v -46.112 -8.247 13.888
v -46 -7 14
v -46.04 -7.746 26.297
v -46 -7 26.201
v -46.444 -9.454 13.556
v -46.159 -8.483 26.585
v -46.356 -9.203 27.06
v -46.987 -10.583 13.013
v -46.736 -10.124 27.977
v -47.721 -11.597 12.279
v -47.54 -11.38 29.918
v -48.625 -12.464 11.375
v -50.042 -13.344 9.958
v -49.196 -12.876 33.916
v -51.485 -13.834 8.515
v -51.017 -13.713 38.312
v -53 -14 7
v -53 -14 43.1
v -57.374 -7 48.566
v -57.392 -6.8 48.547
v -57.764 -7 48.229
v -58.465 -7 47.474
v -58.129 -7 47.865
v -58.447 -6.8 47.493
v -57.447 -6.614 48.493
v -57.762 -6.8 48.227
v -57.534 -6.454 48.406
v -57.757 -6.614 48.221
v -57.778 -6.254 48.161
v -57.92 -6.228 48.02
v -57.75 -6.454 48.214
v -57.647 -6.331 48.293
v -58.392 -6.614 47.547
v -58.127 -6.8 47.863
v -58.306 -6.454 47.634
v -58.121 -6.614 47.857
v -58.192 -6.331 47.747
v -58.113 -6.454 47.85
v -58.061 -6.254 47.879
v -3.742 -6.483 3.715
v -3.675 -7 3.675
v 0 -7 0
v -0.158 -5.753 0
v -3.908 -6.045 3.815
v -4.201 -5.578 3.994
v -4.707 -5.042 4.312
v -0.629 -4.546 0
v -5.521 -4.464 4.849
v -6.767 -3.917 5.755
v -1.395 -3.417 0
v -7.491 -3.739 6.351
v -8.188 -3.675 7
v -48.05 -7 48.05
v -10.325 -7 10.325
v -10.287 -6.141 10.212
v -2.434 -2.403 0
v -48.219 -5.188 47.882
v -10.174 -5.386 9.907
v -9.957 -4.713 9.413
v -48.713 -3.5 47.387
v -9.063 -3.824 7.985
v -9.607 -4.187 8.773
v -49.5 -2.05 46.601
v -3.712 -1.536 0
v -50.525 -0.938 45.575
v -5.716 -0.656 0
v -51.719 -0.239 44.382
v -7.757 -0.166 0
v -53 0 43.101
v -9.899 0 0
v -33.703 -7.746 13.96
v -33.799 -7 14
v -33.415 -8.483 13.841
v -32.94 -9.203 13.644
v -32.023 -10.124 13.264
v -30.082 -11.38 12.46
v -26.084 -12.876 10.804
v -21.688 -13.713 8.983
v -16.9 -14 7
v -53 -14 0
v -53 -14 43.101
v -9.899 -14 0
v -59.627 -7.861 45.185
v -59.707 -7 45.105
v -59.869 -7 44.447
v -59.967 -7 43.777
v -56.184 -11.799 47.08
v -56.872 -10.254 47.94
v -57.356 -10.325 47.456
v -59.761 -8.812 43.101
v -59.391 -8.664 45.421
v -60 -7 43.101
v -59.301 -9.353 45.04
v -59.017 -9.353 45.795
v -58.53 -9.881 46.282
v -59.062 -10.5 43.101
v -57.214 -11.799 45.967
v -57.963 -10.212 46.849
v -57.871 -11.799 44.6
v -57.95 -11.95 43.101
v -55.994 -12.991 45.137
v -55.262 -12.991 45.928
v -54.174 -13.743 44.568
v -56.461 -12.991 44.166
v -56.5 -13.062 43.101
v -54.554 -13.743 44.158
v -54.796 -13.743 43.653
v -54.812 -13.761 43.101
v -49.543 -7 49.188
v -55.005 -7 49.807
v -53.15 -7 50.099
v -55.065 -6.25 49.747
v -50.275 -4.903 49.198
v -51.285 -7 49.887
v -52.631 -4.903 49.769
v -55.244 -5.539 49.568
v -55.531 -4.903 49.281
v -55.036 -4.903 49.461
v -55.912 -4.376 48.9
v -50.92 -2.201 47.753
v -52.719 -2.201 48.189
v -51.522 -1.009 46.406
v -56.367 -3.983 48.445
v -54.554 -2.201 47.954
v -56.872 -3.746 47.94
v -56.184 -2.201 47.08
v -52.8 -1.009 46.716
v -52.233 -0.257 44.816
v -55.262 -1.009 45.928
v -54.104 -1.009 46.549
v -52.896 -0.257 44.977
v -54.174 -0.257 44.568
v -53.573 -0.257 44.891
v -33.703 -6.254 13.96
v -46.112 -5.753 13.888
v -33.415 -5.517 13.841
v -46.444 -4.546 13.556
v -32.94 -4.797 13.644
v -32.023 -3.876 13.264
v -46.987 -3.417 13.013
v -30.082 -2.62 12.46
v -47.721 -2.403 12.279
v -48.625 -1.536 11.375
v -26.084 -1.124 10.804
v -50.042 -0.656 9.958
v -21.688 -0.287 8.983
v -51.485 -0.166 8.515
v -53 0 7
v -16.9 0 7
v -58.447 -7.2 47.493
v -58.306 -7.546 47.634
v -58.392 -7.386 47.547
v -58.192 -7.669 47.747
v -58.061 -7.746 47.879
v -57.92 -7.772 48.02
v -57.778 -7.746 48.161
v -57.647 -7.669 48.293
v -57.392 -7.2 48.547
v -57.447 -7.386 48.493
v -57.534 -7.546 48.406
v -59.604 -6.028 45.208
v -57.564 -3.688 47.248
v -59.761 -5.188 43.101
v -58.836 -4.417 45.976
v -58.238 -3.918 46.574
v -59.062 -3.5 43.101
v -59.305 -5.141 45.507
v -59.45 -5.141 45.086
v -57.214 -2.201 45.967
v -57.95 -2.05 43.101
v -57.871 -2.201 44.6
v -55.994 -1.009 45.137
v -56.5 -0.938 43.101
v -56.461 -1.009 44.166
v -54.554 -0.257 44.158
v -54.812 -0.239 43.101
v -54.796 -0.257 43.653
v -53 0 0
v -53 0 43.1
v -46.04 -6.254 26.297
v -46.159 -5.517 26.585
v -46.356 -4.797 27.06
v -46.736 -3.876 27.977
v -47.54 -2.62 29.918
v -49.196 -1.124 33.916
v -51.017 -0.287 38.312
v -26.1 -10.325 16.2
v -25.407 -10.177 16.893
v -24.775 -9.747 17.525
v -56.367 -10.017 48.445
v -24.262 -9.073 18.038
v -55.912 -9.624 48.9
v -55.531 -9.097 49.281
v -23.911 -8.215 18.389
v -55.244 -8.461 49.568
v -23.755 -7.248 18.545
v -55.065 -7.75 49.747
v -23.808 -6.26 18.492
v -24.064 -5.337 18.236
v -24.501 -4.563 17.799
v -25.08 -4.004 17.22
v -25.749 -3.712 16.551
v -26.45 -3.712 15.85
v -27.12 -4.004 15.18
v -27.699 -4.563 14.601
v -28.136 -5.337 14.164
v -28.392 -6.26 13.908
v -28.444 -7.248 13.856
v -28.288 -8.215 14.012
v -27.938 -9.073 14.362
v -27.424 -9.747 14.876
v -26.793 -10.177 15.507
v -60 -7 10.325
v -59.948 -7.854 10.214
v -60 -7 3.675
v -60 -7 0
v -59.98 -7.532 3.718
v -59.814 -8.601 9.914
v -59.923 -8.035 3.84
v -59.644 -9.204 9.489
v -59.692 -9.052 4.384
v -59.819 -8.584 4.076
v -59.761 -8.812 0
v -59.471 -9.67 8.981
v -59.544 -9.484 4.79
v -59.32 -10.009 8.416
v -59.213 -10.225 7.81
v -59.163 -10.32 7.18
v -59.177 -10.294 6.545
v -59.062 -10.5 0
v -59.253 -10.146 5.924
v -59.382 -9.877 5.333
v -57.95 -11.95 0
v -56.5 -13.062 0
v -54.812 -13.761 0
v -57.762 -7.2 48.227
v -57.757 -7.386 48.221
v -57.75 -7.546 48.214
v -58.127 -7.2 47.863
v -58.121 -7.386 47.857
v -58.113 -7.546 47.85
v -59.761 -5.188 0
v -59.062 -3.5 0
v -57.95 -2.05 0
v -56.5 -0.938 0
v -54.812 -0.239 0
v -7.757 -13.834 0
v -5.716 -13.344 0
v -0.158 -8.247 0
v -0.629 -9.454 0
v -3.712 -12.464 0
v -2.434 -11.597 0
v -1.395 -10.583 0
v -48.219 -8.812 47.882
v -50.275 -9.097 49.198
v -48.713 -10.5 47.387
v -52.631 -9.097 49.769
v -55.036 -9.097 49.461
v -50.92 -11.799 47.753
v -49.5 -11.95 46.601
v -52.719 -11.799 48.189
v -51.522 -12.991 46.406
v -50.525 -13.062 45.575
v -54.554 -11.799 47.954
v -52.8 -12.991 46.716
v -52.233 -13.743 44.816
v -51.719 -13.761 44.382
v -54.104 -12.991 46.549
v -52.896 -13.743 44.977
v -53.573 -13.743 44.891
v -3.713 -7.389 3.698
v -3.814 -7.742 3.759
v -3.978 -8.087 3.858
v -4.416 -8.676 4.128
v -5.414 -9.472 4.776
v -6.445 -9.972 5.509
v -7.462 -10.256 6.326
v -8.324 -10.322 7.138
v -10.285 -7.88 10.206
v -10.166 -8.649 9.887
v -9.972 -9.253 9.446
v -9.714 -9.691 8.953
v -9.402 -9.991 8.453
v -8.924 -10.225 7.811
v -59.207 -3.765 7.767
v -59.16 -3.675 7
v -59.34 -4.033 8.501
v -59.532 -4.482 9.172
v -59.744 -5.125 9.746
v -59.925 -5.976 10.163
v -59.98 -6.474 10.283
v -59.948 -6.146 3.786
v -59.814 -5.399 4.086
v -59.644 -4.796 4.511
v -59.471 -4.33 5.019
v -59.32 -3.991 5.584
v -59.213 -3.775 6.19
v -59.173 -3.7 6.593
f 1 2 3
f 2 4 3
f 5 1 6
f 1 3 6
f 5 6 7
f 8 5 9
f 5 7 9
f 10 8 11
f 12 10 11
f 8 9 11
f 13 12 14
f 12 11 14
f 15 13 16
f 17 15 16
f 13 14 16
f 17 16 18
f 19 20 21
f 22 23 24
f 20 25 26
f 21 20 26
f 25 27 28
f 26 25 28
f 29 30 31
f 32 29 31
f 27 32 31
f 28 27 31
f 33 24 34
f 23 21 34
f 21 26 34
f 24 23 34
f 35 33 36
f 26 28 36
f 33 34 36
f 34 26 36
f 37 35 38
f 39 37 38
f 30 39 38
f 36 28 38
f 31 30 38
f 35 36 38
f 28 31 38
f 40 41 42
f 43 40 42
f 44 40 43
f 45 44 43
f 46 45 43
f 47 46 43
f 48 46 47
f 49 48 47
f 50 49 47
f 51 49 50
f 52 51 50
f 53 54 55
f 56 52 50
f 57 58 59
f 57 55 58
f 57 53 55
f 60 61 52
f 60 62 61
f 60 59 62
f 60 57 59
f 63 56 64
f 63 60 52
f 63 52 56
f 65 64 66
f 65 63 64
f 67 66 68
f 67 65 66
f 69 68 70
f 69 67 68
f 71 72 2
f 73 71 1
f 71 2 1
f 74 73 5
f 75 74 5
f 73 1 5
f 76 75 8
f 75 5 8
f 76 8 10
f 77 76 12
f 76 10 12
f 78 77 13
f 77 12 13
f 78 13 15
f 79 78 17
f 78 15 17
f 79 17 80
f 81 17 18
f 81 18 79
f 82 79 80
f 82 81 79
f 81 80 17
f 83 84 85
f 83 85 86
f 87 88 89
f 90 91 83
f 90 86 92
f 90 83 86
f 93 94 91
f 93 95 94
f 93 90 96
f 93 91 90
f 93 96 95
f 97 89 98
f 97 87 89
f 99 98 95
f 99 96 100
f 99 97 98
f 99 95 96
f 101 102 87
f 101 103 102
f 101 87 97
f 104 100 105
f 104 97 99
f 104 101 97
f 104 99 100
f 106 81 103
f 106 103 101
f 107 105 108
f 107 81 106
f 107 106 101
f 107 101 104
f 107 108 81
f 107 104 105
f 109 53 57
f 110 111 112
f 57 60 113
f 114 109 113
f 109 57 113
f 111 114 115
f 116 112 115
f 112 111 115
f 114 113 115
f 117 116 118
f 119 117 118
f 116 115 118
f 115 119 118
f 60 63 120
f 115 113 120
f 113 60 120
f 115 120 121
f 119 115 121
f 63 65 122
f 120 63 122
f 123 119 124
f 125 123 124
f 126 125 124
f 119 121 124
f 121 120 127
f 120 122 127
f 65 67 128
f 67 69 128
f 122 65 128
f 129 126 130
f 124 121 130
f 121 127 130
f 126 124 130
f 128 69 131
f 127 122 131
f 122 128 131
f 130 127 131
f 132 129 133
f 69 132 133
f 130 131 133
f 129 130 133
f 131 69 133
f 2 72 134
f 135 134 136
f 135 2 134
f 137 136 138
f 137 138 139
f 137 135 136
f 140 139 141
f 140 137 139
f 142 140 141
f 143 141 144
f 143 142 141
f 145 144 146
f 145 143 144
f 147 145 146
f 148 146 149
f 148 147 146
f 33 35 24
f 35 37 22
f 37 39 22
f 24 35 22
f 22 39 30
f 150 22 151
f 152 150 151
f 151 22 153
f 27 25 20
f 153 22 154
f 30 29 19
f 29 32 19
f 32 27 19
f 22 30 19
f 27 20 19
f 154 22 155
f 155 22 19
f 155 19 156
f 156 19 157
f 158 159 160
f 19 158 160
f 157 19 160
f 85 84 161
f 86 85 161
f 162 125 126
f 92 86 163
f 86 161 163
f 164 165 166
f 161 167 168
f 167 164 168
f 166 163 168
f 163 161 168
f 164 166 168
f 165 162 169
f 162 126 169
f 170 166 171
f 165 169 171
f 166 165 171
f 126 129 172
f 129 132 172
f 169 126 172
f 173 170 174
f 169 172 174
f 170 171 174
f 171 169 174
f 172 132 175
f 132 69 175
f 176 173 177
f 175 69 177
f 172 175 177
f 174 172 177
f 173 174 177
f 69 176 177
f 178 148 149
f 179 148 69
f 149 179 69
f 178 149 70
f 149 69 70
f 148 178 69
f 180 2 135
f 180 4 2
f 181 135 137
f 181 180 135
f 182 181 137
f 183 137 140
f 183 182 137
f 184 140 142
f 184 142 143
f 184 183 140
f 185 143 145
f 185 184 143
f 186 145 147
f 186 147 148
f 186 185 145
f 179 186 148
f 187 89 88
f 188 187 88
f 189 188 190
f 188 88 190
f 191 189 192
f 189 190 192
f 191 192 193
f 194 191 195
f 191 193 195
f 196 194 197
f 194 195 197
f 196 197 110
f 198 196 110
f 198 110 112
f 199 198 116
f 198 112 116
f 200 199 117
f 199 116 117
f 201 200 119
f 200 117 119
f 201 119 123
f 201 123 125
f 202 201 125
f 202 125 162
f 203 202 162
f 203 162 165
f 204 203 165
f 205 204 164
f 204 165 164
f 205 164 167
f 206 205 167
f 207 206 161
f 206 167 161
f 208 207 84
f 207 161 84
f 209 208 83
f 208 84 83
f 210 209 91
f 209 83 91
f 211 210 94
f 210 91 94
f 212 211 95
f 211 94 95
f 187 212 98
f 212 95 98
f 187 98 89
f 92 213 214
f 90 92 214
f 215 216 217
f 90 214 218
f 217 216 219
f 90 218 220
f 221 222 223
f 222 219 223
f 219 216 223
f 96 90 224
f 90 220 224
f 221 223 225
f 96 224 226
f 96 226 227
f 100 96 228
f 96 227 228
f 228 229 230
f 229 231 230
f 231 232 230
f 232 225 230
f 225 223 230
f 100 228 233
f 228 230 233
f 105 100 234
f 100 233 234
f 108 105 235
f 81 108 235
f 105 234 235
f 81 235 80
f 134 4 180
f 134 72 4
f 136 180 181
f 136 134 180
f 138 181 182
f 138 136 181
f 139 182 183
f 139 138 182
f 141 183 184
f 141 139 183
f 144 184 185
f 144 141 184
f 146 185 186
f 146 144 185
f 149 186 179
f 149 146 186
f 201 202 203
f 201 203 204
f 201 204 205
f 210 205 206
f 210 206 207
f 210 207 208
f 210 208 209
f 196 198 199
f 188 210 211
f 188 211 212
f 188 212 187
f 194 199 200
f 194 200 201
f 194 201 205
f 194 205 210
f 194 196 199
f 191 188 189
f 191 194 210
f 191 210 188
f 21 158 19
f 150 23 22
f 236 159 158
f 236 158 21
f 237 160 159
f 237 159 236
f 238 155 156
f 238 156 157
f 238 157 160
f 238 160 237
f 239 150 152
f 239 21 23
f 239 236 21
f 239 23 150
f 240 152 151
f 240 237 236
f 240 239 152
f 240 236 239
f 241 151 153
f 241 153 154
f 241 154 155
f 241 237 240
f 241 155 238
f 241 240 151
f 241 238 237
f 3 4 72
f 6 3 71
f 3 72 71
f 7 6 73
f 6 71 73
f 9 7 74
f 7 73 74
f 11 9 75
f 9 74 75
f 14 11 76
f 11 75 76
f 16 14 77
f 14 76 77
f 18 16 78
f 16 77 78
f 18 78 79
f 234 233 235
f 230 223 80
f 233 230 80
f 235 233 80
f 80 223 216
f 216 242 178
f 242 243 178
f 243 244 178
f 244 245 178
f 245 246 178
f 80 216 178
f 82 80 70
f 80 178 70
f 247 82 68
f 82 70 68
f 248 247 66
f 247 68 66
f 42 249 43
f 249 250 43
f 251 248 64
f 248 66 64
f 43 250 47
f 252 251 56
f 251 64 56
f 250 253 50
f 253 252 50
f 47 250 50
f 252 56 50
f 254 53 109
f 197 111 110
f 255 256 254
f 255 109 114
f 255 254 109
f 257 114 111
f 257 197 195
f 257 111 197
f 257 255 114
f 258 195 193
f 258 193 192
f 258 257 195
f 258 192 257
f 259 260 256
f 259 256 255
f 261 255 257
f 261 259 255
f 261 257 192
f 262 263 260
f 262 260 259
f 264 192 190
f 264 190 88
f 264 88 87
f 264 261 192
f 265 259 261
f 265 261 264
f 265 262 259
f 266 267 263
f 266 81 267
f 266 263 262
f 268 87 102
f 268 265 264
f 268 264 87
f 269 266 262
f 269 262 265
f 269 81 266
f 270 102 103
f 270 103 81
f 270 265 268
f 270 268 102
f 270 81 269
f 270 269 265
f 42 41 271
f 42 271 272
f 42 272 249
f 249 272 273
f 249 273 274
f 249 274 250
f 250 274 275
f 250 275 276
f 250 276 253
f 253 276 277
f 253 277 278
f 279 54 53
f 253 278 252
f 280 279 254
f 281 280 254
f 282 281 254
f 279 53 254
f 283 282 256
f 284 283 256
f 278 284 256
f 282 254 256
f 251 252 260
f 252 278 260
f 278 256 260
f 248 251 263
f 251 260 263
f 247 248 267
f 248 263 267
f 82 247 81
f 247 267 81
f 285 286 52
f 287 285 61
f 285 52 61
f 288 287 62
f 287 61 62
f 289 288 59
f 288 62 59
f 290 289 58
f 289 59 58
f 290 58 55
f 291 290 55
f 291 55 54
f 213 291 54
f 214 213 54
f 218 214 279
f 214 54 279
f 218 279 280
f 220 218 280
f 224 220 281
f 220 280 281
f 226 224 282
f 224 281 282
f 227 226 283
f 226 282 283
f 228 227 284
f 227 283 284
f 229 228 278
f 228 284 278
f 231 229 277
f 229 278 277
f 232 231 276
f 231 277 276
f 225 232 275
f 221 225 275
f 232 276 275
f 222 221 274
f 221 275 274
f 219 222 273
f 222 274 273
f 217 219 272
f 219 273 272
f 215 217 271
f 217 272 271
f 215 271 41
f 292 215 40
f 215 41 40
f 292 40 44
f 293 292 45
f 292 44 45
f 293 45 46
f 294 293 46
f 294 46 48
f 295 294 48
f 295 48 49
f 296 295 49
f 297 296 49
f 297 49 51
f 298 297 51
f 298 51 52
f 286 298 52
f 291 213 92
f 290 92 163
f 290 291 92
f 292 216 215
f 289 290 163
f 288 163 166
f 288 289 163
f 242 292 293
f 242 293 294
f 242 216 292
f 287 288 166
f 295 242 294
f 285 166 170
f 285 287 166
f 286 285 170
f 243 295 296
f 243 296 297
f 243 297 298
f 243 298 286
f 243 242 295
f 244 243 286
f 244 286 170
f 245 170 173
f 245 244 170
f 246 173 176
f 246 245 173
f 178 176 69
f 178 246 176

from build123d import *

# Parameters (mm, degrees)
F1_DEPTH = 14
F2_R     = 6.99999
F3_R     = 3.325
F4_DEPTH = 75
F6_R     = 3.325
F7_DEPTH = 45


# Not quite as in the source:
# - a fillet or chamfer is up to 0.001 mm smaller than in the source, because OpenCascade refuses the exact size


with BuildPart() as f1:
    # F0 (on Front) → F1 (new body)
    with BuildSketch(Plane.XZ):
        with BuildLine():
            Line((-60, 0), (0, 0))
            Line((0, 0), (-48.0502525317, 48.0502525317))
            ThreePointArc((-48.0502525317, 48.0502525317), (-52.6133842686, 50.0898203572), (-57.3736269721, 48.5659773311))
            ThreePointArc((-57.3736269721, 48.5659773311), (-59.3093339111, 46.1323865911), (-60, 43.1005050634))
            Line((-60, 43.1005050634), (-60, 0))
        make_face()
        Polygon((-33.7989898732, 14), (-46, 14), (-46, 26.2010101268), align=None, mode=Mode.SUBTRACT)
    extrude(amount=F1_DEPTH)

    # F2 (radius 7 in the source; OpenCascade refuses exactly that, so slightly less here)
    f2_edges = [f1.edges().sort_by_distance(p)[0] for p in [
        (-24.025126, -14, 24.025126),
        (-39.899495, -14, 20.100505),
        (-46, -14, 20.100505),
        (-39.899495, -14, 14),
        (-24.025126, 0, 24.025126),
        (-39.899495, 0, 20.100505),
        (-46, 0, 20.100505),
        (-39.899495, 0, 14),
    ]]
    fillet(f2_edges, radius=F2_R)

    # F3 (on Right) → F4 (cut)
    with BuildSketch(Plane.YZ):
        with Locations((-7, 7)):
            Circle(F3_R)
    extrude(amount=-F4_DEPTH, mode=Mode.SUBTRACT)

    # F6 (on face) → F7 (cut)
    with BuildSketch(Plane(origin=(-52.9698021516, 0, 52.9698021516), x_dir=(0, -1, 0), z_dir=(-0.7071067812, 0, 0.7071067812))):
        with Locations((7, -7)):
            Circle(F6_R)
    extrude(amount=-F7_DEPTH, mode=Mode.SUBTRACT)


solid = f1.part
